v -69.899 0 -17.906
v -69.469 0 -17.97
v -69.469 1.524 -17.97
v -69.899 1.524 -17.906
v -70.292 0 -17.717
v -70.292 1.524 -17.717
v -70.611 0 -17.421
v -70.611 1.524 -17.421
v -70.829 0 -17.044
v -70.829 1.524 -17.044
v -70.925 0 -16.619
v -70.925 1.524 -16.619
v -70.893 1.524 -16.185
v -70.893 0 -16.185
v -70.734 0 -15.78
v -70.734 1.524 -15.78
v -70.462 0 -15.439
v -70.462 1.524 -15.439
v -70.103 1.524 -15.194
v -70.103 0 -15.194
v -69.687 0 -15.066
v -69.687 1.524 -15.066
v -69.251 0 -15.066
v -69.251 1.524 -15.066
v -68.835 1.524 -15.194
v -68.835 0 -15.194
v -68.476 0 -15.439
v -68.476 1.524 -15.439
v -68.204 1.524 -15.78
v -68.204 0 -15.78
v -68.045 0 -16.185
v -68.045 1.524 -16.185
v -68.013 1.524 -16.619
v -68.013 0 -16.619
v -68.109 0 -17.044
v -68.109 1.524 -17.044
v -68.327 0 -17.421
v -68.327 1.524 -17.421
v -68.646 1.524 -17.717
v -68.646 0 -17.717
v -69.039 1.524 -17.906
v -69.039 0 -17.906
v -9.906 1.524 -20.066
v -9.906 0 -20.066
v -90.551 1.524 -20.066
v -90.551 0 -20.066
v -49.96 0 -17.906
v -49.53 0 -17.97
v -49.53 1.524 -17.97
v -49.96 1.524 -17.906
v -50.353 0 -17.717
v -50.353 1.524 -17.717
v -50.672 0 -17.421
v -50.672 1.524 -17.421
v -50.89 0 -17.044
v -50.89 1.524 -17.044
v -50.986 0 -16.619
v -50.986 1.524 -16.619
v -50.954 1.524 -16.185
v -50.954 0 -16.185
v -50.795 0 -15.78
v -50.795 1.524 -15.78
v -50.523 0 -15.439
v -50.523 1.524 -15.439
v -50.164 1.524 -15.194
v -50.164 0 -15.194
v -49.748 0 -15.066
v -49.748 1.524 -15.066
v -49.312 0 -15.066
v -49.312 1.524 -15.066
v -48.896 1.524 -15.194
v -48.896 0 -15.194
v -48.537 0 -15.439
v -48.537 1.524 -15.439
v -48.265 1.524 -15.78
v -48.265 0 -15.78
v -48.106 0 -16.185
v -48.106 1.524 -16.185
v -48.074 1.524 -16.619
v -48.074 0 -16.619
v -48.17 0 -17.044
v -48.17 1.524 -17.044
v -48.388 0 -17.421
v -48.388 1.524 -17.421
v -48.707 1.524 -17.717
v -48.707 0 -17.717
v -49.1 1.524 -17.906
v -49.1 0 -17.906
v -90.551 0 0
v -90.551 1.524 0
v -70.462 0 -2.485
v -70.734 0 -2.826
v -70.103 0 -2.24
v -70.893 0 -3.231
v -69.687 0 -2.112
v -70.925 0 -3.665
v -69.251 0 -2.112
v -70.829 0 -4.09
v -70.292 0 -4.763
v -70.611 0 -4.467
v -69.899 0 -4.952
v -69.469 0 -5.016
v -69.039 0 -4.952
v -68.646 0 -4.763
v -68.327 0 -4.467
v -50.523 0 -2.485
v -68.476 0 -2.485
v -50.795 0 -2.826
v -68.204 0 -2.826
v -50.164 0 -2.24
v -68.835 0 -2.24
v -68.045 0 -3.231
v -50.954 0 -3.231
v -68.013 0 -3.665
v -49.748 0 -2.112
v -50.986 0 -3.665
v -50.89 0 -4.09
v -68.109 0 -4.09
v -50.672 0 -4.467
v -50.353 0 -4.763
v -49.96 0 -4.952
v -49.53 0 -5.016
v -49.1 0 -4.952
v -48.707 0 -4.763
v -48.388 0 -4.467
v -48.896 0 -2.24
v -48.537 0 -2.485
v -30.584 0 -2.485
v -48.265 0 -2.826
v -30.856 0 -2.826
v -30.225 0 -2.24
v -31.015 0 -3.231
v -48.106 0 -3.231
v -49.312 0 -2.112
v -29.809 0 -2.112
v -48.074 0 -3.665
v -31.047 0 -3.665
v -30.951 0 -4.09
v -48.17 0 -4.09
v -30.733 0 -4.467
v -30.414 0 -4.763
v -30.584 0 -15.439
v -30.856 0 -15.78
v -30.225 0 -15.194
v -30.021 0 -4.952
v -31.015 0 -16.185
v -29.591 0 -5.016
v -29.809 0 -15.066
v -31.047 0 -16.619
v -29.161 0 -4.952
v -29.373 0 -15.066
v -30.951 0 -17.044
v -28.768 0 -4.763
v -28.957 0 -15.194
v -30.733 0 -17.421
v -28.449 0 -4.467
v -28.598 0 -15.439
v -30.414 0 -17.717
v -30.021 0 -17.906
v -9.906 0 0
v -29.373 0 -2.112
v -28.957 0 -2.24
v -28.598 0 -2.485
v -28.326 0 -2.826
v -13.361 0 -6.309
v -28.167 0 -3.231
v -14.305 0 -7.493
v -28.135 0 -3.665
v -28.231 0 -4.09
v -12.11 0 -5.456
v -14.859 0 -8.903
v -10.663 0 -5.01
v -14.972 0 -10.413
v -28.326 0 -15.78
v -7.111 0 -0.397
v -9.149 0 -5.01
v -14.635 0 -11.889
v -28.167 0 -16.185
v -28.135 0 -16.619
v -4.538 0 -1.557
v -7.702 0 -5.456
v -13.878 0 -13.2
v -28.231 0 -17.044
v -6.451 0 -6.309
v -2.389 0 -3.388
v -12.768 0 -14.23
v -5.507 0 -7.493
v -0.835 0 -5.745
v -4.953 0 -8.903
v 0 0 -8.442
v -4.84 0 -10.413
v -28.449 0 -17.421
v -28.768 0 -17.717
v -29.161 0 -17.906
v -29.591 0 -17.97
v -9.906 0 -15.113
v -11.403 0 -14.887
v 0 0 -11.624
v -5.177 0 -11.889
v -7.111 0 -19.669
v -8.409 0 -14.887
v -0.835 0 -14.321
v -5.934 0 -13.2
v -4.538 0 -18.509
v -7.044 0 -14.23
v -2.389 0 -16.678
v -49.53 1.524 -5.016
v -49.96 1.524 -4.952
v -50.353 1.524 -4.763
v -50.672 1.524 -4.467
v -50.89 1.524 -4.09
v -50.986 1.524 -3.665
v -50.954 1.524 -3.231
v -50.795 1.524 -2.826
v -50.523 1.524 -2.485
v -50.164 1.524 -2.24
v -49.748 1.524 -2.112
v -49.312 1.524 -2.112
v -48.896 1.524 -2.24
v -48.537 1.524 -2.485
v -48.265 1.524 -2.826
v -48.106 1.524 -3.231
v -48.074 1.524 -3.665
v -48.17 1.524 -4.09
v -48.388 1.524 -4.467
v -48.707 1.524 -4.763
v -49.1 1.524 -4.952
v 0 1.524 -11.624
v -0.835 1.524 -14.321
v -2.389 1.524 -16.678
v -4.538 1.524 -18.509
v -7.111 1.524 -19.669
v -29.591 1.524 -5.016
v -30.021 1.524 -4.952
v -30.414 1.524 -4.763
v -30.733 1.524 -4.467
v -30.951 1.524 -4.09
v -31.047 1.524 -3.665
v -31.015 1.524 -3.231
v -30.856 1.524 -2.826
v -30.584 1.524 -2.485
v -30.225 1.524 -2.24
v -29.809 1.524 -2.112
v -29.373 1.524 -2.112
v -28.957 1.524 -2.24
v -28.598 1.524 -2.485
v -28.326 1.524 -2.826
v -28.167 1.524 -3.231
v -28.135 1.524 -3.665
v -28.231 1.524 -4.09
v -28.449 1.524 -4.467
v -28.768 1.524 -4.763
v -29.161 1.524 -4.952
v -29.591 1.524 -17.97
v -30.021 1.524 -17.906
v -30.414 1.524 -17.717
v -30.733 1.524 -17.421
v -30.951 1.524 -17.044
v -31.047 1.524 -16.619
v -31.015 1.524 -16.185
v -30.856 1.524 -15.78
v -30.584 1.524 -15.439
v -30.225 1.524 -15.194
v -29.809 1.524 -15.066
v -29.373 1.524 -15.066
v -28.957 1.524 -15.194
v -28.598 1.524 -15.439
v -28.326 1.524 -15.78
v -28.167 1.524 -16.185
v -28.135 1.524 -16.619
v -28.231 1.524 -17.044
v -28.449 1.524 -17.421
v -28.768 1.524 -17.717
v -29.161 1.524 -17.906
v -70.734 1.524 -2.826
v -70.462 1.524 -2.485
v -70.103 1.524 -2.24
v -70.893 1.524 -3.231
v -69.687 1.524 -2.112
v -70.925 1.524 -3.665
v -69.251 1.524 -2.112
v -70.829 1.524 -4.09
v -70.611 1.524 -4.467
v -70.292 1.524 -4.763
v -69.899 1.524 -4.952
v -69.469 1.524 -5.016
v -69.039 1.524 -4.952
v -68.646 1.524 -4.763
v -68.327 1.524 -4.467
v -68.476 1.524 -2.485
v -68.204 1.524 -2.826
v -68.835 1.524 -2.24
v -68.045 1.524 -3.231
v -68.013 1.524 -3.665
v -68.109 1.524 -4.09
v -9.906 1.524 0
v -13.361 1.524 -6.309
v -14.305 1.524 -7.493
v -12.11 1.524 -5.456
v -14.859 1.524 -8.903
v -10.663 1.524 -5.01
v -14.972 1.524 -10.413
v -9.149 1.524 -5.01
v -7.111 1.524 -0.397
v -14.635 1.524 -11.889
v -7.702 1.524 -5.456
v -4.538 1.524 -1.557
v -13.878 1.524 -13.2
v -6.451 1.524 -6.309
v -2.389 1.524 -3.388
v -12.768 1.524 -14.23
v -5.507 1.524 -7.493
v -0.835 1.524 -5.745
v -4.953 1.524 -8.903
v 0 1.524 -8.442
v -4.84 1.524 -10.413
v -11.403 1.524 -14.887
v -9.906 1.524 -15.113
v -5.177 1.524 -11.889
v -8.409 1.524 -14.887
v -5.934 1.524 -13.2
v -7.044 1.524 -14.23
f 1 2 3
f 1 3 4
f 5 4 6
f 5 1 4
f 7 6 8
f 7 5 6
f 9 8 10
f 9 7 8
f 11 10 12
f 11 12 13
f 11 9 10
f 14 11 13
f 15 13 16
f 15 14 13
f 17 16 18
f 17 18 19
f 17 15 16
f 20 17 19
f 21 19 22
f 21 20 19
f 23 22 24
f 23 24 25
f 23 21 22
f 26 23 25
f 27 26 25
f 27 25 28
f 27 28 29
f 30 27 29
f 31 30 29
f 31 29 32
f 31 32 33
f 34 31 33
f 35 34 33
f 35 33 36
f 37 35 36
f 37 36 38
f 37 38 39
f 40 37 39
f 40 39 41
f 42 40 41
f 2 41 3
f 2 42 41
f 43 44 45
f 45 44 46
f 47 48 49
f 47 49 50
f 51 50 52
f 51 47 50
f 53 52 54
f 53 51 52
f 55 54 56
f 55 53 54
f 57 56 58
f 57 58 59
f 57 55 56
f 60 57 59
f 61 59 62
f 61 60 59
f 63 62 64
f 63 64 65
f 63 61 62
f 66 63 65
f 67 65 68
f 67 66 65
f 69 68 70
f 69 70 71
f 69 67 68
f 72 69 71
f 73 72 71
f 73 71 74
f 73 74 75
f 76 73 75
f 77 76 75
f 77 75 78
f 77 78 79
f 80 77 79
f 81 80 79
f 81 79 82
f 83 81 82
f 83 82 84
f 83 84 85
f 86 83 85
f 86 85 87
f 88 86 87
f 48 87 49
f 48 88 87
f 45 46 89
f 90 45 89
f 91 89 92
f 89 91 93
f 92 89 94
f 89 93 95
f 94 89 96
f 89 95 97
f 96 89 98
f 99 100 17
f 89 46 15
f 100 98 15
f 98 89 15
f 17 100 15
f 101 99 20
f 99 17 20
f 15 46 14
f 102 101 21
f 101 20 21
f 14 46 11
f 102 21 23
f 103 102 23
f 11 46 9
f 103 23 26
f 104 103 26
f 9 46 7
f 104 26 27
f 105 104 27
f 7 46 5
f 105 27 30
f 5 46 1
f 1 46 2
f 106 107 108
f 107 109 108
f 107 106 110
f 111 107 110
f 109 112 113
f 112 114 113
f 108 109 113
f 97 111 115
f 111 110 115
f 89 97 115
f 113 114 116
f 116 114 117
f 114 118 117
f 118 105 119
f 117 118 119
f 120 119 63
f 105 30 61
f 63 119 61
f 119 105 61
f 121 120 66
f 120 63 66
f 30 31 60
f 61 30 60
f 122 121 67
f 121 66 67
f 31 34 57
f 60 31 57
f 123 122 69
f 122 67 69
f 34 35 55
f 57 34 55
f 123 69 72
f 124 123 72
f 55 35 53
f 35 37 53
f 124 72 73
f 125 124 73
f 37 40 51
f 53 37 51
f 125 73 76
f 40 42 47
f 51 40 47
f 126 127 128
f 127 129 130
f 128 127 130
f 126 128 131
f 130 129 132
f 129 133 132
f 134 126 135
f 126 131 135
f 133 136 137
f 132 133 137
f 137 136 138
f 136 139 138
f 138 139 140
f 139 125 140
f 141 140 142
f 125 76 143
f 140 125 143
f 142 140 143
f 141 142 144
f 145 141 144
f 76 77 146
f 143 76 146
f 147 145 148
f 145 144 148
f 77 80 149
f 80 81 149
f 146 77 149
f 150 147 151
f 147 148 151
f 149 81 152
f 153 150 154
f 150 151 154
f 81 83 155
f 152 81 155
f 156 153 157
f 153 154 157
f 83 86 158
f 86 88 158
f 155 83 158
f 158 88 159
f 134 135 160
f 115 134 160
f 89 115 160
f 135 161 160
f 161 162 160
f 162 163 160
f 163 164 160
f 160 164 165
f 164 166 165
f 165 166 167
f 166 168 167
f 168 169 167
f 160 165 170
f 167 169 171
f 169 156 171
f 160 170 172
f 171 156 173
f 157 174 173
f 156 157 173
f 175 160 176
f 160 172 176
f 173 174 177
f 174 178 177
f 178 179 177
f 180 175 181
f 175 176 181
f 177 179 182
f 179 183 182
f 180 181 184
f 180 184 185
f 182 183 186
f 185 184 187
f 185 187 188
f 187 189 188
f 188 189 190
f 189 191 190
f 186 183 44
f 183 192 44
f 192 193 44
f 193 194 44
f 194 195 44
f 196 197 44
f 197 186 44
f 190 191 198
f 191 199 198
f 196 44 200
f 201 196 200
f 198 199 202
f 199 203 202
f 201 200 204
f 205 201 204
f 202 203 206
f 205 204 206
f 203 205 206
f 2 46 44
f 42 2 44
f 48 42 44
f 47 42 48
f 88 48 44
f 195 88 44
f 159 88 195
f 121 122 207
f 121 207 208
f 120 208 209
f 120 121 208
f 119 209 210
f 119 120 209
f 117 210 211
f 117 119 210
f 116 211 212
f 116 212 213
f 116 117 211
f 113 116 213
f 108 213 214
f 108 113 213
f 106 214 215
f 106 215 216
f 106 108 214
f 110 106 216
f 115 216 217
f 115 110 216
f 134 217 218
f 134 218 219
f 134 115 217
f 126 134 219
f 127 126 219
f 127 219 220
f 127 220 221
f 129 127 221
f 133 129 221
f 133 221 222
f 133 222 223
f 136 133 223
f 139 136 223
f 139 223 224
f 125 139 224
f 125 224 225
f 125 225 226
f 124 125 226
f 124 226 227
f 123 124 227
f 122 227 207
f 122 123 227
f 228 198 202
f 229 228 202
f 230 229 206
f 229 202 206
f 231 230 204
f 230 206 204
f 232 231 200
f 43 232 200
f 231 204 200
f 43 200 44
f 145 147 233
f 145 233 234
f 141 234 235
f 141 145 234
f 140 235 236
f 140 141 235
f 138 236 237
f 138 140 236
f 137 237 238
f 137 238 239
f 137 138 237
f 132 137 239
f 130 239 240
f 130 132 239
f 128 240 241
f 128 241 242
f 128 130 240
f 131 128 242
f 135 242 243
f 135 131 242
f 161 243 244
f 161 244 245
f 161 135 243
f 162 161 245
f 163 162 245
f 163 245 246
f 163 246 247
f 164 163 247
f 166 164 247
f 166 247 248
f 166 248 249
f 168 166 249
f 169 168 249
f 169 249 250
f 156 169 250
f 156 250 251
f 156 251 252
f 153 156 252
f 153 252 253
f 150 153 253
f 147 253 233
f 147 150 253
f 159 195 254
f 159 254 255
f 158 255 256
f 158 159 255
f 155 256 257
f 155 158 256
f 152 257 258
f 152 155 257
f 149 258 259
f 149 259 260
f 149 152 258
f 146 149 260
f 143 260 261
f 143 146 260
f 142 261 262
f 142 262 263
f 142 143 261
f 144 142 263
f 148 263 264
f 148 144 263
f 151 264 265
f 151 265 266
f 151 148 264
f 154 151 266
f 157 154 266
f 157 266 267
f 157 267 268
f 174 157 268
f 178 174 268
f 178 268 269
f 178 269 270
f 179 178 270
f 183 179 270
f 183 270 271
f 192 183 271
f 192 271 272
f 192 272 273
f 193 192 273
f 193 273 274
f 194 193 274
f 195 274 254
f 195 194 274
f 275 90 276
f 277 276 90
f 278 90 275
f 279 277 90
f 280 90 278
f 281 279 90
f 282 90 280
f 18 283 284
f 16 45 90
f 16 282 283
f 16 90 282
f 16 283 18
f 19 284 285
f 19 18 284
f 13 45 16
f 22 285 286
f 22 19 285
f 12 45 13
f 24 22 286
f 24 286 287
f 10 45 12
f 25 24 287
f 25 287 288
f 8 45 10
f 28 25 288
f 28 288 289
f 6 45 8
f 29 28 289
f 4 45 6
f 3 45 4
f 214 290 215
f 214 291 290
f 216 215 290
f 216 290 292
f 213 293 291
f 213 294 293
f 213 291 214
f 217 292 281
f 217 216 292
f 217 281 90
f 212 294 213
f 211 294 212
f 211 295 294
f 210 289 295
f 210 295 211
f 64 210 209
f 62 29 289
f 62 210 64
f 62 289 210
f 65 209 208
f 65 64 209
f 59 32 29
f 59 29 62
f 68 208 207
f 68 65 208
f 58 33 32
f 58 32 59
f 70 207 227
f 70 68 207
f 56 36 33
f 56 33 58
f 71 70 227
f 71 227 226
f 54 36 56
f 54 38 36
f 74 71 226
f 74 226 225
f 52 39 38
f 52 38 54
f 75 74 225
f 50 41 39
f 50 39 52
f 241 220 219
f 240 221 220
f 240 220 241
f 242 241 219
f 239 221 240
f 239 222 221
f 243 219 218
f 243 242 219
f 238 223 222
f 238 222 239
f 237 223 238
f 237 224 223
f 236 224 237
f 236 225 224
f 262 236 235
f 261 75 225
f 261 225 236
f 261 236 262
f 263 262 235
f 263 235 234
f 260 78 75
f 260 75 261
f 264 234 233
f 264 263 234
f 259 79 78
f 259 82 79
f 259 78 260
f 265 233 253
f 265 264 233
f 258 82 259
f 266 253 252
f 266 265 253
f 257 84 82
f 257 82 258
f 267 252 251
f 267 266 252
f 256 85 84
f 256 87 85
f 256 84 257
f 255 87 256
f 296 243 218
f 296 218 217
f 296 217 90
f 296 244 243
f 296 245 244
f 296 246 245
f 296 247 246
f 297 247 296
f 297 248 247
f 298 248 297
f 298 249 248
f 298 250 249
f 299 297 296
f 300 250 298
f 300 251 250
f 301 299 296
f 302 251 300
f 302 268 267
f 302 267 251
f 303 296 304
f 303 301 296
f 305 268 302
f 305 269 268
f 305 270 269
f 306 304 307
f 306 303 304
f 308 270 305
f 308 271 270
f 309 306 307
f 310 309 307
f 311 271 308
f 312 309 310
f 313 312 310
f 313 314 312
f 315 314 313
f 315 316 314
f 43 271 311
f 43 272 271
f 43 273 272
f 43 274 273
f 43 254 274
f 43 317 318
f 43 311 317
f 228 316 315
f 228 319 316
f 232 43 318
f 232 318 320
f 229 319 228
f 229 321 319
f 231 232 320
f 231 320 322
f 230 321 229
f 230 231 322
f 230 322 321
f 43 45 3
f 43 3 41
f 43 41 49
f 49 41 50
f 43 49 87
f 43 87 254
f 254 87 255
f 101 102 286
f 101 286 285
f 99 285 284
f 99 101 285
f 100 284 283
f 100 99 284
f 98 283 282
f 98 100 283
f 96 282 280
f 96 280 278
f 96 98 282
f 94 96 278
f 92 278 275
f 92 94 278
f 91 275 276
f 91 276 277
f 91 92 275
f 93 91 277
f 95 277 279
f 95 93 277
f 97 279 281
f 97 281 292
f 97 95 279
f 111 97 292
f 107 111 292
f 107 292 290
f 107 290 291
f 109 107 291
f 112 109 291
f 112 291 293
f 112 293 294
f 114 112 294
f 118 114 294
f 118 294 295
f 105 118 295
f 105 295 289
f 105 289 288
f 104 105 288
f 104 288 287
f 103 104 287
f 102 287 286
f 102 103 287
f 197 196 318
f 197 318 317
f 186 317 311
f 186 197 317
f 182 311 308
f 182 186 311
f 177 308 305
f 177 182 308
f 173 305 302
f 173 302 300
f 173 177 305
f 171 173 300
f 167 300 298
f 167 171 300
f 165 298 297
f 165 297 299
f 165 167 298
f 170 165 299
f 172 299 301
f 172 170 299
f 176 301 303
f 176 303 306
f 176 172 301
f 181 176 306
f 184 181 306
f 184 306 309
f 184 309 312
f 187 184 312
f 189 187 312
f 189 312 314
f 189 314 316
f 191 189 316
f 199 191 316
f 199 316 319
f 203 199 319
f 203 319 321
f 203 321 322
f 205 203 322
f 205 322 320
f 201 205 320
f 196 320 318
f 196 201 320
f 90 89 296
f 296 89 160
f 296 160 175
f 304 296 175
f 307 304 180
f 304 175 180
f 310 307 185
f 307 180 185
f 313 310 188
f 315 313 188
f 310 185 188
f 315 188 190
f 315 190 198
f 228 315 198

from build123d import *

# Parameters (mm, degrees)
SKETCH1_R           = 1.4605
SKETCH1_R_2         = 5.08
BOSS_EXTRUDE1_DEPTH = 1.524


with BuildPart() as part:
    # Sketch1 → Boss-Extrude1 (new body)
    with BuildSketch(Plane(origin=(0, 0, 0), x_dir=(1, 0, 0), z_dir=(0, 1, 0))):
        with BuildLine():
            Line((-90.551, 0), (-9.906, 0))
            ThreePointArc((-9.906, 0), (-3.398484286, 2.396683595), (0, 8.441694561))
            Line((0, 8.441694561), (0, 11.624305439))
            ThreePointArc((0, 11.624305439), (-3.398484286, 17.669316405), (-9.906, 20.066))
            Line((-9.906, 20.066), (-90.551, 20.066))
            Line((-90.551, 20.066), (-90.551, 0))
        make_face()
        with Locations(Location((-69.469, 3.556, 0), (0, 0, 90))):
            Circle(SKETCH1_R, mode=Mode.SUBTRACT)
        with Locations(Location((-49.53, 3.556, 0), (0, 0, 90))):
            Circle(SKETCH1_R, mode=Mode.SUBTRACT)
        with Locations(Location((-29.591, 3.556, 0), (0, 0, 90))):
            Circle(SKETCH1_R, mode=Mode.SUBTRACT)
        with Locations(Location((-69.469, 16.51, 0), (0, 0, 90))):
            Circle(SKETCH1_R, mode=Mode.SUBTRACT)
        with Locations(Location((-49.53, 16.51, 0), (0, 0, 90))):
            Circle(SKETCH1_R, mode=Mode.SUBTRACT)
        with Locations(Location((-9.906, 10.033, 0), (0, 0, 90))):
            Circle(SKETCH1_R_2, mode=Mode.SUBTRACT)
        with Locations(Location((-29.591, 16.51, 0), (0, 0, 90))):
            Circle(SKETCH1_R, mode=Mode.SUBTRACT)
    extrude(amount=BOSS_EXTRUDE1_DEPTH)


solid = part.part
